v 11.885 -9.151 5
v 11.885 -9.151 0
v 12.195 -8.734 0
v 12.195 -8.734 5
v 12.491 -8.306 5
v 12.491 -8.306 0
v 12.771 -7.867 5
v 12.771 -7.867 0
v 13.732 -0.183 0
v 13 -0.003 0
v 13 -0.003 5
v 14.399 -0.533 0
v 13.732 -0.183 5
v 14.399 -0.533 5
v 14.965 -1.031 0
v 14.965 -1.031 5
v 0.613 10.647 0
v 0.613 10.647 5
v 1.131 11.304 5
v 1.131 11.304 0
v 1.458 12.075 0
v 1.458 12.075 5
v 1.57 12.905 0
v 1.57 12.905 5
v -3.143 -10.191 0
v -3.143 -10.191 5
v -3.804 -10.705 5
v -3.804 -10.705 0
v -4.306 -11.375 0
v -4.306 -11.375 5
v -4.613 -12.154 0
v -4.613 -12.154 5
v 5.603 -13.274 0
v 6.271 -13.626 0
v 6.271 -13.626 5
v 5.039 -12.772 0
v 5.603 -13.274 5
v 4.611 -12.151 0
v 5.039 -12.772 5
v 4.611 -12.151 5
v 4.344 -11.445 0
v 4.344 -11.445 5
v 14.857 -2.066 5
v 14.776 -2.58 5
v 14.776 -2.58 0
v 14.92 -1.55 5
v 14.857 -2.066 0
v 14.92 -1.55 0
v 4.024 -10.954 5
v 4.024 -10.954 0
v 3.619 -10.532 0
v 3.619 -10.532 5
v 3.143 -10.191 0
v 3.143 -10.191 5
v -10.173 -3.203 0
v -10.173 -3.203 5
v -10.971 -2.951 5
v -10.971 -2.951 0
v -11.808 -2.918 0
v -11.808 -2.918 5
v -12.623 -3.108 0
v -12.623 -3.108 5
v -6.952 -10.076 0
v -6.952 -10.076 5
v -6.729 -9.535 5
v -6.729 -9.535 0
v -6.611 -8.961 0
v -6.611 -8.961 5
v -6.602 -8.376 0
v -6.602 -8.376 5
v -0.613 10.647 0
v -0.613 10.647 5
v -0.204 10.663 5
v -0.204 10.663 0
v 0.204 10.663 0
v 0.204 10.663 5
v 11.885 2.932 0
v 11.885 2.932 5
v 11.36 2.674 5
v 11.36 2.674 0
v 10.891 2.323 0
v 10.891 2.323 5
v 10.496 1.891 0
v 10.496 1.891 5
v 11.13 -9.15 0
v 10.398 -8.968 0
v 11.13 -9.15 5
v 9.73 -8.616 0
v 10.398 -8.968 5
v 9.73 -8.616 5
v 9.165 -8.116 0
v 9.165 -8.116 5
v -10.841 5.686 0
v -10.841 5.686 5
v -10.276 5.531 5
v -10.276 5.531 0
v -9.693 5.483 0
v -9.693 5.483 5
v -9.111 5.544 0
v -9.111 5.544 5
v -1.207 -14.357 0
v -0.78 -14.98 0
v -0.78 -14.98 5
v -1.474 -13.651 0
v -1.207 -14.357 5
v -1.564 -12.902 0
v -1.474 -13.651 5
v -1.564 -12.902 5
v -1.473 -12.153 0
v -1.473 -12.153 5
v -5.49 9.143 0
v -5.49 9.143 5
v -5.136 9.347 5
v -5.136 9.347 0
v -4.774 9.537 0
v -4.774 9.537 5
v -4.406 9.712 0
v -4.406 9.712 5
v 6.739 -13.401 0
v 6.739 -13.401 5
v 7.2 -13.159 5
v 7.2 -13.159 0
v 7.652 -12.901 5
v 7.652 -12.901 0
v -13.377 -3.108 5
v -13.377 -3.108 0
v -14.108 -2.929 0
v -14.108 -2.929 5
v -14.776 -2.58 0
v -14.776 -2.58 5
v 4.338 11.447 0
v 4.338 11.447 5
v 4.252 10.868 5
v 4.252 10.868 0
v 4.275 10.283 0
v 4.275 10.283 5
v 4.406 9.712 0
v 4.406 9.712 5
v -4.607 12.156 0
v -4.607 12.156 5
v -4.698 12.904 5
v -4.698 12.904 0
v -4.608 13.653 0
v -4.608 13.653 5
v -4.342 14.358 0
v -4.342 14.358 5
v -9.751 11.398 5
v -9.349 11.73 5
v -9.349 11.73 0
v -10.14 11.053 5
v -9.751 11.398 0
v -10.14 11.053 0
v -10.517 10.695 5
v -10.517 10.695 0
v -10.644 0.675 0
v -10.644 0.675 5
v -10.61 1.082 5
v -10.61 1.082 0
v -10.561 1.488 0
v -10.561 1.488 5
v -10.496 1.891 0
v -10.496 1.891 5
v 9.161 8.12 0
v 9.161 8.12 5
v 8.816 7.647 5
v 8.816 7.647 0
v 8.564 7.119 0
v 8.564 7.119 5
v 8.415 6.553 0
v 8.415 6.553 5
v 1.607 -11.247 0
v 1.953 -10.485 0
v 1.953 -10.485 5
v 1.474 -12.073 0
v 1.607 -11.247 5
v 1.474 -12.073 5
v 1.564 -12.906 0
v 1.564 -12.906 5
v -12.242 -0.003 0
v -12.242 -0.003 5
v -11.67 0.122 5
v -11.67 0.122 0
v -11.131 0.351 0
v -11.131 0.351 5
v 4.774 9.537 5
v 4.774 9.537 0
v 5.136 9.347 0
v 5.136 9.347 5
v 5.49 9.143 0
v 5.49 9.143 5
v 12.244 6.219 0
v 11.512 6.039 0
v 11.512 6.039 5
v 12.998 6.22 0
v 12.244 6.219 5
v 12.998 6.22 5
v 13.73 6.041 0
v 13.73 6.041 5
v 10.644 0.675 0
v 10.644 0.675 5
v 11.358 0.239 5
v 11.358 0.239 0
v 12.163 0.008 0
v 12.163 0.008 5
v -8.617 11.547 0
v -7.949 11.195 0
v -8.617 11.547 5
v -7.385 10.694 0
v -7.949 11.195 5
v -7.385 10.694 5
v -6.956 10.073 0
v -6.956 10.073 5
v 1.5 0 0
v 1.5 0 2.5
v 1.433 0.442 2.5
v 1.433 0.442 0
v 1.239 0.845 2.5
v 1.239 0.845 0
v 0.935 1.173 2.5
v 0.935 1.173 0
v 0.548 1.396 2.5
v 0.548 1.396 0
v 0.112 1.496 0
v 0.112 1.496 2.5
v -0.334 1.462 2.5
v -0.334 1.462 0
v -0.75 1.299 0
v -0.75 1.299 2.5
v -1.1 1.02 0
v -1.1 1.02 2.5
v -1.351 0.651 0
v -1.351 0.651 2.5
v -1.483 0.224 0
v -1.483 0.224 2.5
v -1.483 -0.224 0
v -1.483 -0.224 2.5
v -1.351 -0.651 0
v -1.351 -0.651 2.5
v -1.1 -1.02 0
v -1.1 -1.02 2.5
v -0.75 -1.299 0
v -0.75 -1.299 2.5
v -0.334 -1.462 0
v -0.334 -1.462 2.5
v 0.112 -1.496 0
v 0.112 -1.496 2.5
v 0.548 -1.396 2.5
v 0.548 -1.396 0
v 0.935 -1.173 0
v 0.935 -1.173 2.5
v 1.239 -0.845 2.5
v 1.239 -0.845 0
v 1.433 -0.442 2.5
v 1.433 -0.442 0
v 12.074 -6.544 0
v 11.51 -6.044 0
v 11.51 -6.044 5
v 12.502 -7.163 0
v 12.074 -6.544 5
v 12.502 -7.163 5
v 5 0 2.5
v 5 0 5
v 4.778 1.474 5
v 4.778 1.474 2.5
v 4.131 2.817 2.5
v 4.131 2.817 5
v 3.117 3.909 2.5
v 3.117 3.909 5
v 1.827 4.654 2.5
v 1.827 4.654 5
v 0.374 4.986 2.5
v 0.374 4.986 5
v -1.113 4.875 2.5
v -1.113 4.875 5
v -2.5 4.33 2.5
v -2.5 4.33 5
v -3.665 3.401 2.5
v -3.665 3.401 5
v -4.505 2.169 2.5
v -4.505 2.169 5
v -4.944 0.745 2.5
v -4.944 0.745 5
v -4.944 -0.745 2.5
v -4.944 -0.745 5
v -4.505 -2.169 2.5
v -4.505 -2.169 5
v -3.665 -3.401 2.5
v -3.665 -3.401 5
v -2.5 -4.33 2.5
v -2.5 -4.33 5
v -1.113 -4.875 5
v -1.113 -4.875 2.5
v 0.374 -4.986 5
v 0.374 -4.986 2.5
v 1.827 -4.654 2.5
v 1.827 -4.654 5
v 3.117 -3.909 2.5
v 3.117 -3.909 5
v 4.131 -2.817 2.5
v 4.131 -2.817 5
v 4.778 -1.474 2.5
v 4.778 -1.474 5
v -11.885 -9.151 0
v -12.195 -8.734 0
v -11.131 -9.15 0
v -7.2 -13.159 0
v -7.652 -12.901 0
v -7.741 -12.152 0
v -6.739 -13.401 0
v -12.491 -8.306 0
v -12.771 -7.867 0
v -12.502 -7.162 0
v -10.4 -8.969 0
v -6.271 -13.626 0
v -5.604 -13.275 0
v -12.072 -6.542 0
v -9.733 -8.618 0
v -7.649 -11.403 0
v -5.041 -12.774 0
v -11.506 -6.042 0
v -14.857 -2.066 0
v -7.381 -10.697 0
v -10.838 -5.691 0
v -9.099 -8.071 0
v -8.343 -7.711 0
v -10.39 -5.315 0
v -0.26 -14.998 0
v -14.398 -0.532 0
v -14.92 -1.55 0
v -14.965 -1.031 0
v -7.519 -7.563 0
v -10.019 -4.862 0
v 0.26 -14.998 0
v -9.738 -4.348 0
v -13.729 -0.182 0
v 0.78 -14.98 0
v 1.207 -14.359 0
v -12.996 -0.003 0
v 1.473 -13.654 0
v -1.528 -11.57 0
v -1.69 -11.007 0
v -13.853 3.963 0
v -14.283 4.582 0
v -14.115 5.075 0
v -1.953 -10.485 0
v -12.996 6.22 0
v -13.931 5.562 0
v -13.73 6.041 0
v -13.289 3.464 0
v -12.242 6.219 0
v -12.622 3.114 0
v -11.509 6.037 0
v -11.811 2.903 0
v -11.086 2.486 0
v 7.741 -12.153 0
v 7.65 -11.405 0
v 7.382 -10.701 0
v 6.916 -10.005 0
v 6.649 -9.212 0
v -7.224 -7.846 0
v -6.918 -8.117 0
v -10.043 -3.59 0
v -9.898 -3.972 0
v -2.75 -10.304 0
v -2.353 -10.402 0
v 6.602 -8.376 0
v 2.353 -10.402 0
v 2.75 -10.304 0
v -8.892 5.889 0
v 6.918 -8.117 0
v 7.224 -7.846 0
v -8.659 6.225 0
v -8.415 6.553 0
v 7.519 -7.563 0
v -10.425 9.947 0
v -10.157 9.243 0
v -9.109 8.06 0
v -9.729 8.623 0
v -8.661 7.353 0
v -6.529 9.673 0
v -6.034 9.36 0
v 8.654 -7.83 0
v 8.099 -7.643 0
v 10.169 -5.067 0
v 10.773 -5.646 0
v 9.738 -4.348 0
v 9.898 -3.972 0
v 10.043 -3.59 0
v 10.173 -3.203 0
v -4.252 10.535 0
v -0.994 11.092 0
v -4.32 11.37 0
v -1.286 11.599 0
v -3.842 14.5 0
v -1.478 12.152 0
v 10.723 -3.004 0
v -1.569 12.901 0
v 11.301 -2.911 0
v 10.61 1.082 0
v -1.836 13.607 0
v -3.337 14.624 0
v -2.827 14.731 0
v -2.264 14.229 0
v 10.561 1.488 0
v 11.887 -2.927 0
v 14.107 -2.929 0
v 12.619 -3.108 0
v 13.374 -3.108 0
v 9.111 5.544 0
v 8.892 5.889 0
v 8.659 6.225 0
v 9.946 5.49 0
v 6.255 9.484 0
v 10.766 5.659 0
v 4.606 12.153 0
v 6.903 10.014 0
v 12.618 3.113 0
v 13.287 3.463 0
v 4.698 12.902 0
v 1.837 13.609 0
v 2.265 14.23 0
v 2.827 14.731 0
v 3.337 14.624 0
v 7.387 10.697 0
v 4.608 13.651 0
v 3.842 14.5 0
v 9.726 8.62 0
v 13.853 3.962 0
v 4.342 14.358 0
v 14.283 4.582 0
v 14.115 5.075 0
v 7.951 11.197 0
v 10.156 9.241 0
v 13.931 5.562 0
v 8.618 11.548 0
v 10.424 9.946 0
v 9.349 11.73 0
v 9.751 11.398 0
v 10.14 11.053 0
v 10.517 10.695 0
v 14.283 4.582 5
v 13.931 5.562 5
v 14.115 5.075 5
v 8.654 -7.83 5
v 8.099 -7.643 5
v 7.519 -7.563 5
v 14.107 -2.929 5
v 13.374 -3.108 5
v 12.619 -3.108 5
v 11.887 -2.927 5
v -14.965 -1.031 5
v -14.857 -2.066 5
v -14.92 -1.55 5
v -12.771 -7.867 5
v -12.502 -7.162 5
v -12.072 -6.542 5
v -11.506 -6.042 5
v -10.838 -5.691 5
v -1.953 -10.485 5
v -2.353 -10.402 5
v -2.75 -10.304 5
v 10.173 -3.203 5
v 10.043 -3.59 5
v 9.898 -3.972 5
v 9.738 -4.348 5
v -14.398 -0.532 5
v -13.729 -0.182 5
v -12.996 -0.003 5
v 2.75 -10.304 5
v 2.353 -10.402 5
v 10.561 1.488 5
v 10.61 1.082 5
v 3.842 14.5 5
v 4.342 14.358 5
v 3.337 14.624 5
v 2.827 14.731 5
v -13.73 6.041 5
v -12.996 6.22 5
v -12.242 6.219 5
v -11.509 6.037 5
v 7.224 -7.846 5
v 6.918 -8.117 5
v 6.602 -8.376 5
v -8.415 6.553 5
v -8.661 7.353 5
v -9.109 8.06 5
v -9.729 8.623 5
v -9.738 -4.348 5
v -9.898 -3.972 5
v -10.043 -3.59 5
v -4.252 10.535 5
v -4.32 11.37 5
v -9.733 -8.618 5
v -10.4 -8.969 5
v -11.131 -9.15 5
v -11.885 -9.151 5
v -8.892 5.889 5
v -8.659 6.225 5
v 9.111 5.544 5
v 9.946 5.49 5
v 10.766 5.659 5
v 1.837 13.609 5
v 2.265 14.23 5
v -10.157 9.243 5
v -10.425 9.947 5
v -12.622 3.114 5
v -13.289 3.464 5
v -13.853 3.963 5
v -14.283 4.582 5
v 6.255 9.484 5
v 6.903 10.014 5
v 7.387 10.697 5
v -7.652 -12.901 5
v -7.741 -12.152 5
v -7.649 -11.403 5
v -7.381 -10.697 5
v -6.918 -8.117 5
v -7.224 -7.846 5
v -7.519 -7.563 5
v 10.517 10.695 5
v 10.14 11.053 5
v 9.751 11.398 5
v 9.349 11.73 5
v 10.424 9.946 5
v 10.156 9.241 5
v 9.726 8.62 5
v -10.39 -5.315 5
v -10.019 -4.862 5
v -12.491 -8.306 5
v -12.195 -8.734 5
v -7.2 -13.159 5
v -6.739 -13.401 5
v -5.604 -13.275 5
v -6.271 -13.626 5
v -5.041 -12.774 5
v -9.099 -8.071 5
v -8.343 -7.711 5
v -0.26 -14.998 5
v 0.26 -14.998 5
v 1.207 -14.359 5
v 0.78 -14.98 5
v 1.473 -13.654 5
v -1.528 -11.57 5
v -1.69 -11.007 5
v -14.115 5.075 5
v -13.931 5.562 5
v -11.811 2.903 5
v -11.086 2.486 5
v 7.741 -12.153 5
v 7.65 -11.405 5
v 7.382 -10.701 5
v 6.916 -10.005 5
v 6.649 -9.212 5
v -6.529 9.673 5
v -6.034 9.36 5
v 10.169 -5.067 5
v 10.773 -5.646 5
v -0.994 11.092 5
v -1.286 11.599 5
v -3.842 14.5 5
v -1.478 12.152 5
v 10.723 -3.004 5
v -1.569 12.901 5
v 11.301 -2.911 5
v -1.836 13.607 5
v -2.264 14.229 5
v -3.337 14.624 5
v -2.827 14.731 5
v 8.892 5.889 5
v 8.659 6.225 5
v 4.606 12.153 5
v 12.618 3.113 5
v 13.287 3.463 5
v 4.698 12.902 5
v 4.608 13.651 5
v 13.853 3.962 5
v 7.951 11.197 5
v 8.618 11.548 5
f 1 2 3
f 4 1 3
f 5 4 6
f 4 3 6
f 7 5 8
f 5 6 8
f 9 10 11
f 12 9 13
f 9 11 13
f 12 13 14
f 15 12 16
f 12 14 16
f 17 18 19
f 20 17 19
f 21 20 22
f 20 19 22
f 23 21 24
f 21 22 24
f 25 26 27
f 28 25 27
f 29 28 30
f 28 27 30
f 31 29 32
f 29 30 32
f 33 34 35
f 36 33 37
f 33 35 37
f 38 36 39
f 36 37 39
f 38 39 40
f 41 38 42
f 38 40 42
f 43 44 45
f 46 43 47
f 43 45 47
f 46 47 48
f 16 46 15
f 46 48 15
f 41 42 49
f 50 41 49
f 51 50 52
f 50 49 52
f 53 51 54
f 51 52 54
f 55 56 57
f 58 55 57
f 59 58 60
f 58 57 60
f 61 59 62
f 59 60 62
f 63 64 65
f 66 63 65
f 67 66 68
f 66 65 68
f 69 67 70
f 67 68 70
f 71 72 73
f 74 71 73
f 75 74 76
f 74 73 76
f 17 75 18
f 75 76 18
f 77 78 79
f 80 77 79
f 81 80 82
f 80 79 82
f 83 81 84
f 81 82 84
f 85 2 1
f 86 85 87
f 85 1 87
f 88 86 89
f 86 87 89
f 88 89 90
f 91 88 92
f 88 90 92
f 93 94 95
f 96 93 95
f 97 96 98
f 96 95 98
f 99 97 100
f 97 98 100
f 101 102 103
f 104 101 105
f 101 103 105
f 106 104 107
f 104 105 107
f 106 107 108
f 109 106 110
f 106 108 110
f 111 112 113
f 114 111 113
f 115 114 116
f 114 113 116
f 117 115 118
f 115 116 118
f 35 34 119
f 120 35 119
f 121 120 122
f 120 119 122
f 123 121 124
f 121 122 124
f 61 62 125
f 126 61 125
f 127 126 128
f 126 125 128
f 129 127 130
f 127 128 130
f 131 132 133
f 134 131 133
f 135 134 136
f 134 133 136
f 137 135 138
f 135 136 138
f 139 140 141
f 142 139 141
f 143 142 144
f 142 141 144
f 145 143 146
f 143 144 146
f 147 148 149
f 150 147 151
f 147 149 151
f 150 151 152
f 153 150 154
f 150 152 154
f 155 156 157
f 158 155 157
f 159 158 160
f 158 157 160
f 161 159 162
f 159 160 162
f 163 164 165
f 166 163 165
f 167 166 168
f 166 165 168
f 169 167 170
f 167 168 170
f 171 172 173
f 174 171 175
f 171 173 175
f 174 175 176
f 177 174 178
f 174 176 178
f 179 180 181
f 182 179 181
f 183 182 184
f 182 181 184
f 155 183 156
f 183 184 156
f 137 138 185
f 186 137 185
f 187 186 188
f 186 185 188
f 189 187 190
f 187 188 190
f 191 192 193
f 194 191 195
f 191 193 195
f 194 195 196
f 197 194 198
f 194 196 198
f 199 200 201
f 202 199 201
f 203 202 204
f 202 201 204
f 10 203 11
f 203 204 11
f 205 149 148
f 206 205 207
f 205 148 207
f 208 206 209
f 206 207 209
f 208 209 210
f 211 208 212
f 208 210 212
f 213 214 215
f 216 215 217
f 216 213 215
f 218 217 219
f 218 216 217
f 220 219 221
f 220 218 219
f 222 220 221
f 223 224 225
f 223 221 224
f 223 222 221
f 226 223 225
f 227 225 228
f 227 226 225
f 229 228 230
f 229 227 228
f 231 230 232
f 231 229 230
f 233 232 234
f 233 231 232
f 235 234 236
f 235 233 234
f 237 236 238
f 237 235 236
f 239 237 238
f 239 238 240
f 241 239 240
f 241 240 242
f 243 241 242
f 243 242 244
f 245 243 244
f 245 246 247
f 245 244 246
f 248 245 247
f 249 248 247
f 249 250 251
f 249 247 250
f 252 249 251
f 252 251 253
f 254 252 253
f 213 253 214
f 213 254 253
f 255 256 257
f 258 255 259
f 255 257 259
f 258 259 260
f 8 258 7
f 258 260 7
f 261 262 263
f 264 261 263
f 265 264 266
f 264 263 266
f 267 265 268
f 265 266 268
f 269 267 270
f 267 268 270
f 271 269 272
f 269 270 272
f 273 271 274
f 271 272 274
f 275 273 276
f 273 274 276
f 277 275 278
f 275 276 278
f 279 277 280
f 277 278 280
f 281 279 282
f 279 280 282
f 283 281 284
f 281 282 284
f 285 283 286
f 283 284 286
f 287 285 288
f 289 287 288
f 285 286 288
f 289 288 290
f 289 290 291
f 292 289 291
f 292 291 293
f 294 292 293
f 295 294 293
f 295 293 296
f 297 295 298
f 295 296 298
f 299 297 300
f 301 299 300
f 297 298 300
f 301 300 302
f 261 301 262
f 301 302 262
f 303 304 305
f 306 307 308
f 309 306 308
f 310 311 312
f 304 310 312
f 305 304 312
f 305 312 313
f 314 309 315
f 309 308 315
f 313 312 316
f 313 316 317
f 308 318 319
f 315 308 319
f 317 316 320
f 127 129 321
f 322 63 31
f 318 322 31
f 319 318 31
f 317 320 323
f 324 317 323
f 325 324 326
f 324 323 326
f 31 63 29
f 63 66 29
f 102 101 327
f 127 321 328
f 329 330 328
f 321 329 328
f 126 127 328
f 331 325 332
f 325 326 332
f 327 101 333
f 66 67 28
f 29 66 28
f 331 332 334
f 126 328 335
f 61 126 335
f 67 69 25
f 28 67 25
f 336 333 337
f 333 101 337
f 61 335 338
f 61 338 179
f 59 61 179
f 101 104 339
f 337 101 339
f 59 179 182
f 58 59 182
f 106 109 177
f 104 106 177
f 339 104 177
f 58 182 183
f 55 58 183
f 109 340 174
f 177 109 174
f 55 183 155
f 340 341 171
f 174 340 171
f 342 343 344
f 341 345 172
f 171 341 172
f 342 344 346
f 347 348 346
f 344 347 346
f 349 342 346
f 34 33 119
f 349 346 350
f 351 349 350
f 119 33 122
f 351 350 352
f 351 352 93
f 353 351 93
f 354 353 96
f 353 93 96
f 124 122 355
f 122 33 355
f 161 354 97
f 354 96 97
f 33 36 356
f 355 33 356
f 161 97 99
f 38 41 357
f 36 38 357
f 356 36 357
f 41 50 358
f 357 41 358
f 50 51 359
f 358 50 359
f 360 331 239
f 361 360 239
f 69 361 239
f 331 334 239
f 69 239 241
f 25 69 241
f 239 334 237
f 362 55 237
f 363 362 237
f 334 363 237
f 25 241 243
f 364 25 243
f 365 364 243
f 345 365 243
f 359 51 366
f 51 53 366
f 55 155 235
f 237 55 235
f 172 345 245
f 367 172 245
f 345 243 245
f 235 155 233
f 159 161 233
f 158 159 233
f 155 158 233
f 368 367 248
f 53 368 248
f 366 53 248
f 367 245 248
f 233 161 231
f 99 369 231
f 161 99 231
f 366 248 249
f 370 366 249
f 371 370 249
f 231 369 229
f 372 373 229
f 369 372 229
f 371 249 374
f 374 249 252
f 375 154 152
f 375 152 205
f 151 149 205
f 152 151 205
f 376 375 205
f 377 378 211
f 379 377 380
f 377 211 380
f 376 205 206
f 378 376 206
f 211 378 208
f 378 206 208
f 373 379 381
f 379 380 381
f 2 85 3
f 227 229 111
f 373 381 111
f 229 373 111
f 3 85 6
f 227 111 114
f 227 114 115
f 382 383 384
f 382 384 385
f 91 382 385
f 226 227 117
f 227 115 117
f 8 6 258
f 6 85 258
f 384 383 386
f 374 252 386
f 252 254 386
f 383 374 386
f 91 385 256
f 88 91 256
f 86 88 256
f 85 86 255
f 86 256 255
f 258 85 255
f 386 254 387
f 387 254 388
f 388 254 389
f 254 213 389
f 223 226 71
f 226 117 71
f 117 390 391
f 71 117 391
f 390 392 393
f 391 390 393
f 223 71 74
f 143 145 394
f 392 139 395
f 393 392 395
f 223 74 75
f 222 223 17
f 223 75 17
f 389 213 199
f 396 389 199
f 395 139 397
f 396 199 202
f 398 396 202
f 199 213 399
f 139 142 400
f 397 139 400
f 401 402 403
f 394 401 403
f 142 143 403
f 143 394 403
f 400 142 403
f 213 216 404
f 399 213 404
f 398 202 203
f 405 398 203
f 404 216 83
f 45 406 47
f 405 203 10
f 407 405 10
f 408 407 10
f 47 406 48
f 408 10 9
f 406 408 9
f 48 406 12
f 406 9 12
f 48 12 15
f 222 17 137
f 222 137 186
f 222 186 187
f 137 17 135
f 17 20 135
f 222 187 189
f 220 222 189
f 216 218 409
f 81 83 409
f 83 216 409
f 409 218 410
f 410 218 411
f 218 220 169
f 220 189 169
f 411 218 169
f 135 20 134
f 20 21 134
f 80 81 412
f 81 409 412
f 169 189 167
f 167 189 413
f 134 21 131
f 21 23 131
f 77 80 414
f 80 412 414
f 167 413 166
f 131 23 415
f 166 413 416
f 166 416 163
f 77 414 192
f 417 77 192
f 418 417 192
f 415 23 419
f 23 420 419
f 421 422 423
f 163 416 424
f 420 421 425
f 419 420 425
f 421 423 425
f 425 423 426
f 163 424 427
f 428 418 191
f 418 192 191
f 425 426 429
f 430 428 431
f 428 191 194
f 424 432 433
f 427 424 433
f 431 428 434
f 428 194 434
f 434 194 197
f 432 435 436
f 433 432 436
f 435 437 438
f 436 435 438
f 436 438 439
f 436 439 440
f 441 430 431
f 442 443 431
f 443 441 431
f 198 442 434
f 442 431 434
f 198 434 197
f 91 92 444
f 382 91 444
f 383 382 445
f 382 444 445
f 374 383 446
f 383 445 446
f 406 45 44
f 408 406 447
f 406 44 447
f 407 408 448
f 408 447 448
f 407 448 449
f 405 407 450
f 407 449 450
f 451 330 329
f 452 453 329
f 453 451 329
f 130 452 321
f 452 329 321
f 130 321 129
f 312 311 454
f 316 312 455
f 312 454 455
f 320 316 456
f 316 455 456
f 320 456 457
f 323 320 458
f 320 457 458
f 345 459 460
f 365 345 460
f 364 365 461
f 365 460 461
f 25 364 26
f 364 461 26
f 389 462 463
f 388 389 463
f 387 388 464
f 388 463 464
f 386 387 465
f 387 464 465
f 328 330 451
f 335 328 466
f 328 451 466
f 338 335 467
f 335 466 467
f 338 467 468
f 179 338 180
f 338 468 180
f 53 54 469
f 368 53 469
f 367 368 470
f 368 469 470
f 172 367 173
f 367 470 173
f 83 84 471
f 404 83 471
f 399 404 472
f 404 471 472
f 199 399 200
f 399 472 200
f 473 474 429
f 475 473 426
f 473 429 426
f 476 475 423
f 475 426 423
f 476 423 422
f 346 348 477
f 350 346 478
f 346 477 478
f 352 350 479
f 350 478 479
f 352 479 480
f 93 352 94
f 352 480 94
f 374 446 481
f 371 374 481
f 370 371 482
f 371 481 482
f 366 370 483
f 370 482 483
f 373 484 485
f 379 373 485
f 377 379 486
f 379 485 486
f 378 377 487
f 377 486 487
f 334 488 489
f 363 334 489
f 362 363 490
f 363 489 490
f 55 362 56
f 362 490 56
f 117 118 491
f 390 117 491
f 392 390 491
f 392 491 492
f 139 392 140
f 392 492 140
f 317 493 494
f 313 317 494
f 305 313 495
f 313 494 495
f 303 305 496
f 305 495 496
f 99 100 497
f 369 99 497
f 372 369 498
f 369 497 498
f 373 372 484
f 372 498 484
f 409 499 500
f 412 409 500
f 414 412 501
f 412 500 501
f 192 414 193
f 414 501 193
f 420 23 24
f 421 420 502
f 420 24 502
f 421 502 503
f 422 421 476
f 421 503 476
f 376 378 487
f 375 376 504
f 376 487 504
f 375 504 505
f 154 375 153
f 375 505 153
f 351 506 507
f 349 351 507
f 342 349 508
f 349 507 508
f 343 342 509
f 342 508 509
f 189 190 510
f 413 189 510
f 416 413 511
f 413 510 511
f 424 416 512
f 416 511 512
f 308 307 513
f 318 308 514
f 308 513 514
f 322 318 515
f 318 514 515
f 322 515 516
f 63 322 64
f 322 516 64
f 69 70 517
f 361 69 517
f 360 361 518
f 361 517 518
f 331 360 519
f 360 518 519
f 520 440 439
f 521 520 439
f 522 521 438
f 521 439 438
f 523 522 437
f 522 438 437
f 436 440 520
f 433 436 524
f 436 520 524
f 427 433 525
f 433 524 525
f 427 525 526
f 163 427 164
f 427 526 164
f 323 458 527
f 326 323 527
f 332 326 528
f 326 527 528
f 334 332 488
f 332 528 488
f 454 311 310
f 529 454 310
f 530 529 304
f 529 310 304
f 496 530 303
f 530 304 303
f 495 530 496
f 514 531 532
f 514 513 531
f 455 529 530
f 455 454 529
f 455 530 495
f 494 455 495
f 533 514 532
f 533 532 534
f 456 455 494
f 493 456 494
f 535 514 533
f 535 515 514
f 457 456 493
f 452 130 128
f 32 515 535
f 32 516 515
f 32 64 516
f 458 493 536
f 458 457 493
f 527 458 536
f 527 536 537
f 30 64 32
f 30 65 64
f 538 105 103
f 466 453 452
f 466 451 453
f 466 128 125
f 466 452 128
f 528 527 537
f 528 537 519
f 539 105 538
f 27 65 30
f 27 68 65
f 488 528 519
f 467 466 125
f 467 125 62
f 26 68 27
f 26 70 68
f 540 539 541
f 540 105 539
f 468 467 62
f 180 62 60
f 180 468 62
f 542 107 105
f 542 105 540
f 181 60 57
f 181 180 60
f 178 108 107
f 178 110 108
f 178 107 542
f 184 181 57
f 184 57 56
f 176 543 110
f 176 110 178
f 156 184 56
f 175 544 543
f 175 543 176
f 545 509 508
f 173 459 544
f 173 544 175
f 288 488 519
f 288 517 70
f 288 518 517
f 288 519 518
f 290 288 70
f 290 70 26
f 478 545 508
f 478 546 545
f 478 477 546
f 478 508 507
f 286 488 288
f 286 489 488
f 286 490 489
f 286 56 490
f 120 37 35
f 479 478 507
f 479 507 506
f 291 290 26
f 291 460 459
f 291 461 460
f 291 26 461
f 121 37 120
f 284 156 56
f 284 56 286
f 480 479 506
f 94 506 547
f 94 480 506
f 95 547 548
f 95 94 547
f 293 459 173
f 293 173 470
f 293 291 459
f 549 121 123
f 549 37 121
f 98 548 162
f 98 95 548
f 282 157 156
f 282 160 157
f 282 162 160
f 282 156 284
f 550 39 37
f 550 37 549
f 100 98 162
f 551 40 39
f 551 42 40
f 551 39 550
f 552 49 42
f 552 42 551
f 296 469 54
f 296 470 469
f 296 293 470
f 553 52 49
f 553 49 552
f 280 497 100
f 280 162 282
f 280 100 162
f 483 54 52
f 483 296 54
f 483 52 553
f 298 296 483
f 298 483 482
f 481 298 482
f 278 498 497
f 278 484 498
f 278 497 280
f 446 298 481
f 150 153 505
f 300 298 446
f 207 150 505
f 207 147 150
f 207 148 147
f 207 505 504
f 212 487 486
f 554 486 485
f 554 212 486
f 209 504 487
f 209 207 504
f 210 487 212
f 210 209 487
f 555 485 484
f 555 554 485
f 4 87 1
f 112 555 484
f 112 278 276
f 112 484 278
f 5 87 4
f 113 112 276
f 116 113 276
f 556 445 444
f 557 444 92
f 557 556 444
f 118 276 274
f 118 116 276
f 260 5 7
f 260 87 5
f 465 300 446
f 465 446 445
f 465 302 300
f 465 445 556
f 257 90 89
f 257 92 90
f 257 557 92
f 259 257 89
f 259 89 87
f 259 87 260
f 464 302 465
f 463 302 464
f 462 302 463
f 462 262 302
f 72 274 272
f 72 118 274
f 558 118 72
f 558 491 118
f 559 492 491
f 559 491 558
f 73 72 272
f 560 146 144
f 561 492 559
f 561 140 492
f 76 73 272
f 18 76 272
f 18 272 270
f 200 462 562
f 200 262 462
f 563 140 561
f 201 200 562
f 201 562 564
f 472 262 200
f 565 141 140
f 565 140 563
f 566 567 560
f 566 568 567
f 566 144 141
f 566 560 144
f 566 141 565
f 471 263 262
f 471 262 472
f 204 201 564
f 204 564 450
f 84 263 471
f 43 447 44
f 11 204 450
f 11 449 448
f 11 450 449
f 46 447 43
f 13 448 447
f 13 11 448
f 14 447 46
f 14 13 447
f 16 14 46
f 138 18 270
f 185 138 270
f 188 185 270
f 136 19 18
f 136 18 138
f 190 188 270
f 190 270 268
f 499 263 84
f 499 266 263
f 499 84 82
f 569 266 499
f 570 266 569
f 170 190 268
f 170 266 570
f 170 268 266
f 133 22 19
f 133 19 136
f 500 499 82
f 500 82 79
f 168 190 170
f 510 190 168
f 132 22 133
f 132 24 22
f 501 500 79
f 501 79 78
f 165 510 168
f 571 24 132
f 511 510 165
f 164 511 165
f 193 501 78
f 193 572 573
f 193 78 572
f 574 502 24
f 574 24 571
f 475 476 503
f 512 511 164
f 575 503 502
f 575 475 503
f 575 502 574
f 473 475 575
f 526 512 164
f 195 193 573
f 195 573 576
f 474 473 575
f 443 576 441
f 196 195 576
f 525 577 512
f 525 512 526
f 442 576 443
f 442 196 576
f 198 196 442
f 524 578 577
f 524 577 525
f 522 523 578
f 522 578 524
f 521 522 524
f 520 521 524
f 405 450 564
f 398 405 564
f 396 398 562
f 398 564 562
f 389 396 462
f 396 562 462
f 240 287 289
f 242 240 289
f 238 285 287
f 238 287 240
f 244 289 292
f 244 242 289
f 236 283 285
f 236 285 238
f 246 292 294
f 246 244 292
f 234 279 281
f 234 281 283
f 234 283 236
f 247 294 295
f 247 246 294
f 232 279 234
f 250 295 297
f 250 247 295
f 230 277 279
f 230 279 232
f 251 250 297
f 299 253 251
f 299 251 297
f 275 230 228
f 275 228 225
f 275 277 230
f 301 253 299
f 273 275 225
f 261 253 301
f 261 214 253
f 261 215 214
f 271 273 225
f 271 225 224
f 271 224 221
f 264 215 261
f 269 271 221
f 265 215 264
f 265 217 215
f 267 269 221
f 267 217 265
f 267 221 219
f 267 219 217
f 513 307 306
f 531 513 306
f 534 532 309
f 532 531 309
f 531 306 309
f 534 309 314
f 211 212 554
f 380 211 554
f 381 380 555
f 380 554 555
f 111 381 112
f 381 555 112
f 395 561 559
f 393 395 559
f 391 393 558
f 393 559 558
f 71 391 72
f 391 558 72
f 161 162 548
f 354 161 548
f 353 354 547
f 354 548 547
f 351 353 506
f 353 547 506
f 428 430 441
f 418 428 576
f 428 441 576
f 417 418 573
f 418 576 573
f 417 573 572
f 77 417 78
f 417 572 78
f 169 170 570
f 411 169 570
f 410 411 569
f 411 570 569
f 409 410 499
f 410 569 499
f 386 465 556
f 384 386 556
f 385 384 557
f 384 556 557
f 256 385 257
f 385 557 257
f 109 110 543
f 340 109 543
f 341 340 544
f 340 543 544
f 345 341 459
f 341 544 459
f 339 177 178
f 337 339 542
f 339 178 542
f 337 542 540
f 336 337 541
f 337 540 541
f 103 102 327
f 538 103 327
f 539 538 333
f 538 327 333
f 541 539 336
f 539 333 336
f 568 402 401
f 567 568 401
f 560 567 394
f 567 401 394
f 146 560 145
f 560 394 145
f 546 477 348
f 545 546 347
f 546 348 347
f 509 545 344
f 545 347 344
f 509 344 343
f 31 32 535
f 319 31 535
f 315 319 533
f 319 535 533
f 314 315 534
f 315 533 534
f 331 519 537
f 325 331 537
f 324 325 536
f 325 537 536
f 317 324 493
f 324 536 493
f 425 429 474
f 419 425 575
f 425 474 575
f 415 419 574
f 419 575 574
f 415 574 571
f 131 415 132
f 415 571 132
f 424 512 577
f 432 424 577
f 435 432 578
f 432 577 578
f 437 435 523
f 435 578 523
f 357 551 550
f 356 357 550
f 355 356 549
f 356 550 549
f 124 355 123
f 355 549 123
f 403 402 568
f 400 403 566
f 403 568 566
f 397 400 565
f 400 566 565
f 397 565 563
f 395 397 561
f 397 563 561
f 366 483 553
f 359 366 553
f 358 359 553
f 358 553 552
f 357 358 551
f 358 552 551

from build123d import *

# Parameters (mm, degrees)
CROQUIS1_R              = 15
CROQUIS1_R_2            = 1.5
SALIENTE_EXTRUIR1_DEPTH = 5
CORTAR_EXTRUIR1_DEPTH   = 22.794494718
MATRIZC1_COUNT          = 13
CROQUIS3_R              = 5
CORTAR_EXTRUIR2_DEPTH   = 2.5


with BuildPart() as part:
    # Croquis1 → Saliente-Extruir1 (new body)
    with BuildSketch(Plane.XY):
        Circle(CROQUIS1_R)
        Circle(CROQUIS1_R_2, mode=Mode.SUBTRACT)
    extrude(amount=SALIENTE_EXTRUIR1_DEPTH)

    # Croquis2 → Cortar-Extruir1 (cut, through all)
    with BuildSketch(Plane.XY.offset(5)):
        with BuildLine():
            ThreePointArc((2.827423232, 14.731112581), (0, 15), (-2.827423232, 14.731112581))
            ThreePointArc((-2.827423232, 14.731112581), (-1.836024404, 13.60728926), (-1.478404899, 12.151968408))
            ThreePointArc((-1.478404899, 12.151968408), (-1.151515386, 11.338657004), (-0.612545475, 10.64739466))
            ThreePointArc((-0.612545475, 10.64739466), (0, 10.665), (0.612545475, 10.64739466))
            ThreePointArc((0.612545475, 10.64739466), (1.320743225, 11.678795886), (1.57, 12.904847926))
            ThreePointArc((1.57, 12.904847926), (2.032147713, 13.93266315), (2.827423232, 14.731112581))
        make_face()
    cortar_extruir1 = extrude(amount=-CORTAR_EXTRUIR1_DEPTH, mode=Mode.SUBTRACT)

    # MatrizC1: Cortar-Extruir1 ×13 about axis
    matrizc1_axis = Axis((0, 0, 0), (0, 0, 1))
    for i in range(1, MATRIZC1_COUNT):
        add(cortar_extruir1.rotate(matrizc1_axis, i * 360 / MATRIZC1_COUNT), mode=Mode.SUBTRACT)

    # Croquis3 → Cortar-Extruir2 (cut)
    with BuildSketch(Plane.XY.offset(5)):
        Circle(CROQUIS3_R)
    extrude(amount=-CORTAR_EXTRUIR2_DEPTH, mode=Mode.SUBTRACT)


solid = part.part
